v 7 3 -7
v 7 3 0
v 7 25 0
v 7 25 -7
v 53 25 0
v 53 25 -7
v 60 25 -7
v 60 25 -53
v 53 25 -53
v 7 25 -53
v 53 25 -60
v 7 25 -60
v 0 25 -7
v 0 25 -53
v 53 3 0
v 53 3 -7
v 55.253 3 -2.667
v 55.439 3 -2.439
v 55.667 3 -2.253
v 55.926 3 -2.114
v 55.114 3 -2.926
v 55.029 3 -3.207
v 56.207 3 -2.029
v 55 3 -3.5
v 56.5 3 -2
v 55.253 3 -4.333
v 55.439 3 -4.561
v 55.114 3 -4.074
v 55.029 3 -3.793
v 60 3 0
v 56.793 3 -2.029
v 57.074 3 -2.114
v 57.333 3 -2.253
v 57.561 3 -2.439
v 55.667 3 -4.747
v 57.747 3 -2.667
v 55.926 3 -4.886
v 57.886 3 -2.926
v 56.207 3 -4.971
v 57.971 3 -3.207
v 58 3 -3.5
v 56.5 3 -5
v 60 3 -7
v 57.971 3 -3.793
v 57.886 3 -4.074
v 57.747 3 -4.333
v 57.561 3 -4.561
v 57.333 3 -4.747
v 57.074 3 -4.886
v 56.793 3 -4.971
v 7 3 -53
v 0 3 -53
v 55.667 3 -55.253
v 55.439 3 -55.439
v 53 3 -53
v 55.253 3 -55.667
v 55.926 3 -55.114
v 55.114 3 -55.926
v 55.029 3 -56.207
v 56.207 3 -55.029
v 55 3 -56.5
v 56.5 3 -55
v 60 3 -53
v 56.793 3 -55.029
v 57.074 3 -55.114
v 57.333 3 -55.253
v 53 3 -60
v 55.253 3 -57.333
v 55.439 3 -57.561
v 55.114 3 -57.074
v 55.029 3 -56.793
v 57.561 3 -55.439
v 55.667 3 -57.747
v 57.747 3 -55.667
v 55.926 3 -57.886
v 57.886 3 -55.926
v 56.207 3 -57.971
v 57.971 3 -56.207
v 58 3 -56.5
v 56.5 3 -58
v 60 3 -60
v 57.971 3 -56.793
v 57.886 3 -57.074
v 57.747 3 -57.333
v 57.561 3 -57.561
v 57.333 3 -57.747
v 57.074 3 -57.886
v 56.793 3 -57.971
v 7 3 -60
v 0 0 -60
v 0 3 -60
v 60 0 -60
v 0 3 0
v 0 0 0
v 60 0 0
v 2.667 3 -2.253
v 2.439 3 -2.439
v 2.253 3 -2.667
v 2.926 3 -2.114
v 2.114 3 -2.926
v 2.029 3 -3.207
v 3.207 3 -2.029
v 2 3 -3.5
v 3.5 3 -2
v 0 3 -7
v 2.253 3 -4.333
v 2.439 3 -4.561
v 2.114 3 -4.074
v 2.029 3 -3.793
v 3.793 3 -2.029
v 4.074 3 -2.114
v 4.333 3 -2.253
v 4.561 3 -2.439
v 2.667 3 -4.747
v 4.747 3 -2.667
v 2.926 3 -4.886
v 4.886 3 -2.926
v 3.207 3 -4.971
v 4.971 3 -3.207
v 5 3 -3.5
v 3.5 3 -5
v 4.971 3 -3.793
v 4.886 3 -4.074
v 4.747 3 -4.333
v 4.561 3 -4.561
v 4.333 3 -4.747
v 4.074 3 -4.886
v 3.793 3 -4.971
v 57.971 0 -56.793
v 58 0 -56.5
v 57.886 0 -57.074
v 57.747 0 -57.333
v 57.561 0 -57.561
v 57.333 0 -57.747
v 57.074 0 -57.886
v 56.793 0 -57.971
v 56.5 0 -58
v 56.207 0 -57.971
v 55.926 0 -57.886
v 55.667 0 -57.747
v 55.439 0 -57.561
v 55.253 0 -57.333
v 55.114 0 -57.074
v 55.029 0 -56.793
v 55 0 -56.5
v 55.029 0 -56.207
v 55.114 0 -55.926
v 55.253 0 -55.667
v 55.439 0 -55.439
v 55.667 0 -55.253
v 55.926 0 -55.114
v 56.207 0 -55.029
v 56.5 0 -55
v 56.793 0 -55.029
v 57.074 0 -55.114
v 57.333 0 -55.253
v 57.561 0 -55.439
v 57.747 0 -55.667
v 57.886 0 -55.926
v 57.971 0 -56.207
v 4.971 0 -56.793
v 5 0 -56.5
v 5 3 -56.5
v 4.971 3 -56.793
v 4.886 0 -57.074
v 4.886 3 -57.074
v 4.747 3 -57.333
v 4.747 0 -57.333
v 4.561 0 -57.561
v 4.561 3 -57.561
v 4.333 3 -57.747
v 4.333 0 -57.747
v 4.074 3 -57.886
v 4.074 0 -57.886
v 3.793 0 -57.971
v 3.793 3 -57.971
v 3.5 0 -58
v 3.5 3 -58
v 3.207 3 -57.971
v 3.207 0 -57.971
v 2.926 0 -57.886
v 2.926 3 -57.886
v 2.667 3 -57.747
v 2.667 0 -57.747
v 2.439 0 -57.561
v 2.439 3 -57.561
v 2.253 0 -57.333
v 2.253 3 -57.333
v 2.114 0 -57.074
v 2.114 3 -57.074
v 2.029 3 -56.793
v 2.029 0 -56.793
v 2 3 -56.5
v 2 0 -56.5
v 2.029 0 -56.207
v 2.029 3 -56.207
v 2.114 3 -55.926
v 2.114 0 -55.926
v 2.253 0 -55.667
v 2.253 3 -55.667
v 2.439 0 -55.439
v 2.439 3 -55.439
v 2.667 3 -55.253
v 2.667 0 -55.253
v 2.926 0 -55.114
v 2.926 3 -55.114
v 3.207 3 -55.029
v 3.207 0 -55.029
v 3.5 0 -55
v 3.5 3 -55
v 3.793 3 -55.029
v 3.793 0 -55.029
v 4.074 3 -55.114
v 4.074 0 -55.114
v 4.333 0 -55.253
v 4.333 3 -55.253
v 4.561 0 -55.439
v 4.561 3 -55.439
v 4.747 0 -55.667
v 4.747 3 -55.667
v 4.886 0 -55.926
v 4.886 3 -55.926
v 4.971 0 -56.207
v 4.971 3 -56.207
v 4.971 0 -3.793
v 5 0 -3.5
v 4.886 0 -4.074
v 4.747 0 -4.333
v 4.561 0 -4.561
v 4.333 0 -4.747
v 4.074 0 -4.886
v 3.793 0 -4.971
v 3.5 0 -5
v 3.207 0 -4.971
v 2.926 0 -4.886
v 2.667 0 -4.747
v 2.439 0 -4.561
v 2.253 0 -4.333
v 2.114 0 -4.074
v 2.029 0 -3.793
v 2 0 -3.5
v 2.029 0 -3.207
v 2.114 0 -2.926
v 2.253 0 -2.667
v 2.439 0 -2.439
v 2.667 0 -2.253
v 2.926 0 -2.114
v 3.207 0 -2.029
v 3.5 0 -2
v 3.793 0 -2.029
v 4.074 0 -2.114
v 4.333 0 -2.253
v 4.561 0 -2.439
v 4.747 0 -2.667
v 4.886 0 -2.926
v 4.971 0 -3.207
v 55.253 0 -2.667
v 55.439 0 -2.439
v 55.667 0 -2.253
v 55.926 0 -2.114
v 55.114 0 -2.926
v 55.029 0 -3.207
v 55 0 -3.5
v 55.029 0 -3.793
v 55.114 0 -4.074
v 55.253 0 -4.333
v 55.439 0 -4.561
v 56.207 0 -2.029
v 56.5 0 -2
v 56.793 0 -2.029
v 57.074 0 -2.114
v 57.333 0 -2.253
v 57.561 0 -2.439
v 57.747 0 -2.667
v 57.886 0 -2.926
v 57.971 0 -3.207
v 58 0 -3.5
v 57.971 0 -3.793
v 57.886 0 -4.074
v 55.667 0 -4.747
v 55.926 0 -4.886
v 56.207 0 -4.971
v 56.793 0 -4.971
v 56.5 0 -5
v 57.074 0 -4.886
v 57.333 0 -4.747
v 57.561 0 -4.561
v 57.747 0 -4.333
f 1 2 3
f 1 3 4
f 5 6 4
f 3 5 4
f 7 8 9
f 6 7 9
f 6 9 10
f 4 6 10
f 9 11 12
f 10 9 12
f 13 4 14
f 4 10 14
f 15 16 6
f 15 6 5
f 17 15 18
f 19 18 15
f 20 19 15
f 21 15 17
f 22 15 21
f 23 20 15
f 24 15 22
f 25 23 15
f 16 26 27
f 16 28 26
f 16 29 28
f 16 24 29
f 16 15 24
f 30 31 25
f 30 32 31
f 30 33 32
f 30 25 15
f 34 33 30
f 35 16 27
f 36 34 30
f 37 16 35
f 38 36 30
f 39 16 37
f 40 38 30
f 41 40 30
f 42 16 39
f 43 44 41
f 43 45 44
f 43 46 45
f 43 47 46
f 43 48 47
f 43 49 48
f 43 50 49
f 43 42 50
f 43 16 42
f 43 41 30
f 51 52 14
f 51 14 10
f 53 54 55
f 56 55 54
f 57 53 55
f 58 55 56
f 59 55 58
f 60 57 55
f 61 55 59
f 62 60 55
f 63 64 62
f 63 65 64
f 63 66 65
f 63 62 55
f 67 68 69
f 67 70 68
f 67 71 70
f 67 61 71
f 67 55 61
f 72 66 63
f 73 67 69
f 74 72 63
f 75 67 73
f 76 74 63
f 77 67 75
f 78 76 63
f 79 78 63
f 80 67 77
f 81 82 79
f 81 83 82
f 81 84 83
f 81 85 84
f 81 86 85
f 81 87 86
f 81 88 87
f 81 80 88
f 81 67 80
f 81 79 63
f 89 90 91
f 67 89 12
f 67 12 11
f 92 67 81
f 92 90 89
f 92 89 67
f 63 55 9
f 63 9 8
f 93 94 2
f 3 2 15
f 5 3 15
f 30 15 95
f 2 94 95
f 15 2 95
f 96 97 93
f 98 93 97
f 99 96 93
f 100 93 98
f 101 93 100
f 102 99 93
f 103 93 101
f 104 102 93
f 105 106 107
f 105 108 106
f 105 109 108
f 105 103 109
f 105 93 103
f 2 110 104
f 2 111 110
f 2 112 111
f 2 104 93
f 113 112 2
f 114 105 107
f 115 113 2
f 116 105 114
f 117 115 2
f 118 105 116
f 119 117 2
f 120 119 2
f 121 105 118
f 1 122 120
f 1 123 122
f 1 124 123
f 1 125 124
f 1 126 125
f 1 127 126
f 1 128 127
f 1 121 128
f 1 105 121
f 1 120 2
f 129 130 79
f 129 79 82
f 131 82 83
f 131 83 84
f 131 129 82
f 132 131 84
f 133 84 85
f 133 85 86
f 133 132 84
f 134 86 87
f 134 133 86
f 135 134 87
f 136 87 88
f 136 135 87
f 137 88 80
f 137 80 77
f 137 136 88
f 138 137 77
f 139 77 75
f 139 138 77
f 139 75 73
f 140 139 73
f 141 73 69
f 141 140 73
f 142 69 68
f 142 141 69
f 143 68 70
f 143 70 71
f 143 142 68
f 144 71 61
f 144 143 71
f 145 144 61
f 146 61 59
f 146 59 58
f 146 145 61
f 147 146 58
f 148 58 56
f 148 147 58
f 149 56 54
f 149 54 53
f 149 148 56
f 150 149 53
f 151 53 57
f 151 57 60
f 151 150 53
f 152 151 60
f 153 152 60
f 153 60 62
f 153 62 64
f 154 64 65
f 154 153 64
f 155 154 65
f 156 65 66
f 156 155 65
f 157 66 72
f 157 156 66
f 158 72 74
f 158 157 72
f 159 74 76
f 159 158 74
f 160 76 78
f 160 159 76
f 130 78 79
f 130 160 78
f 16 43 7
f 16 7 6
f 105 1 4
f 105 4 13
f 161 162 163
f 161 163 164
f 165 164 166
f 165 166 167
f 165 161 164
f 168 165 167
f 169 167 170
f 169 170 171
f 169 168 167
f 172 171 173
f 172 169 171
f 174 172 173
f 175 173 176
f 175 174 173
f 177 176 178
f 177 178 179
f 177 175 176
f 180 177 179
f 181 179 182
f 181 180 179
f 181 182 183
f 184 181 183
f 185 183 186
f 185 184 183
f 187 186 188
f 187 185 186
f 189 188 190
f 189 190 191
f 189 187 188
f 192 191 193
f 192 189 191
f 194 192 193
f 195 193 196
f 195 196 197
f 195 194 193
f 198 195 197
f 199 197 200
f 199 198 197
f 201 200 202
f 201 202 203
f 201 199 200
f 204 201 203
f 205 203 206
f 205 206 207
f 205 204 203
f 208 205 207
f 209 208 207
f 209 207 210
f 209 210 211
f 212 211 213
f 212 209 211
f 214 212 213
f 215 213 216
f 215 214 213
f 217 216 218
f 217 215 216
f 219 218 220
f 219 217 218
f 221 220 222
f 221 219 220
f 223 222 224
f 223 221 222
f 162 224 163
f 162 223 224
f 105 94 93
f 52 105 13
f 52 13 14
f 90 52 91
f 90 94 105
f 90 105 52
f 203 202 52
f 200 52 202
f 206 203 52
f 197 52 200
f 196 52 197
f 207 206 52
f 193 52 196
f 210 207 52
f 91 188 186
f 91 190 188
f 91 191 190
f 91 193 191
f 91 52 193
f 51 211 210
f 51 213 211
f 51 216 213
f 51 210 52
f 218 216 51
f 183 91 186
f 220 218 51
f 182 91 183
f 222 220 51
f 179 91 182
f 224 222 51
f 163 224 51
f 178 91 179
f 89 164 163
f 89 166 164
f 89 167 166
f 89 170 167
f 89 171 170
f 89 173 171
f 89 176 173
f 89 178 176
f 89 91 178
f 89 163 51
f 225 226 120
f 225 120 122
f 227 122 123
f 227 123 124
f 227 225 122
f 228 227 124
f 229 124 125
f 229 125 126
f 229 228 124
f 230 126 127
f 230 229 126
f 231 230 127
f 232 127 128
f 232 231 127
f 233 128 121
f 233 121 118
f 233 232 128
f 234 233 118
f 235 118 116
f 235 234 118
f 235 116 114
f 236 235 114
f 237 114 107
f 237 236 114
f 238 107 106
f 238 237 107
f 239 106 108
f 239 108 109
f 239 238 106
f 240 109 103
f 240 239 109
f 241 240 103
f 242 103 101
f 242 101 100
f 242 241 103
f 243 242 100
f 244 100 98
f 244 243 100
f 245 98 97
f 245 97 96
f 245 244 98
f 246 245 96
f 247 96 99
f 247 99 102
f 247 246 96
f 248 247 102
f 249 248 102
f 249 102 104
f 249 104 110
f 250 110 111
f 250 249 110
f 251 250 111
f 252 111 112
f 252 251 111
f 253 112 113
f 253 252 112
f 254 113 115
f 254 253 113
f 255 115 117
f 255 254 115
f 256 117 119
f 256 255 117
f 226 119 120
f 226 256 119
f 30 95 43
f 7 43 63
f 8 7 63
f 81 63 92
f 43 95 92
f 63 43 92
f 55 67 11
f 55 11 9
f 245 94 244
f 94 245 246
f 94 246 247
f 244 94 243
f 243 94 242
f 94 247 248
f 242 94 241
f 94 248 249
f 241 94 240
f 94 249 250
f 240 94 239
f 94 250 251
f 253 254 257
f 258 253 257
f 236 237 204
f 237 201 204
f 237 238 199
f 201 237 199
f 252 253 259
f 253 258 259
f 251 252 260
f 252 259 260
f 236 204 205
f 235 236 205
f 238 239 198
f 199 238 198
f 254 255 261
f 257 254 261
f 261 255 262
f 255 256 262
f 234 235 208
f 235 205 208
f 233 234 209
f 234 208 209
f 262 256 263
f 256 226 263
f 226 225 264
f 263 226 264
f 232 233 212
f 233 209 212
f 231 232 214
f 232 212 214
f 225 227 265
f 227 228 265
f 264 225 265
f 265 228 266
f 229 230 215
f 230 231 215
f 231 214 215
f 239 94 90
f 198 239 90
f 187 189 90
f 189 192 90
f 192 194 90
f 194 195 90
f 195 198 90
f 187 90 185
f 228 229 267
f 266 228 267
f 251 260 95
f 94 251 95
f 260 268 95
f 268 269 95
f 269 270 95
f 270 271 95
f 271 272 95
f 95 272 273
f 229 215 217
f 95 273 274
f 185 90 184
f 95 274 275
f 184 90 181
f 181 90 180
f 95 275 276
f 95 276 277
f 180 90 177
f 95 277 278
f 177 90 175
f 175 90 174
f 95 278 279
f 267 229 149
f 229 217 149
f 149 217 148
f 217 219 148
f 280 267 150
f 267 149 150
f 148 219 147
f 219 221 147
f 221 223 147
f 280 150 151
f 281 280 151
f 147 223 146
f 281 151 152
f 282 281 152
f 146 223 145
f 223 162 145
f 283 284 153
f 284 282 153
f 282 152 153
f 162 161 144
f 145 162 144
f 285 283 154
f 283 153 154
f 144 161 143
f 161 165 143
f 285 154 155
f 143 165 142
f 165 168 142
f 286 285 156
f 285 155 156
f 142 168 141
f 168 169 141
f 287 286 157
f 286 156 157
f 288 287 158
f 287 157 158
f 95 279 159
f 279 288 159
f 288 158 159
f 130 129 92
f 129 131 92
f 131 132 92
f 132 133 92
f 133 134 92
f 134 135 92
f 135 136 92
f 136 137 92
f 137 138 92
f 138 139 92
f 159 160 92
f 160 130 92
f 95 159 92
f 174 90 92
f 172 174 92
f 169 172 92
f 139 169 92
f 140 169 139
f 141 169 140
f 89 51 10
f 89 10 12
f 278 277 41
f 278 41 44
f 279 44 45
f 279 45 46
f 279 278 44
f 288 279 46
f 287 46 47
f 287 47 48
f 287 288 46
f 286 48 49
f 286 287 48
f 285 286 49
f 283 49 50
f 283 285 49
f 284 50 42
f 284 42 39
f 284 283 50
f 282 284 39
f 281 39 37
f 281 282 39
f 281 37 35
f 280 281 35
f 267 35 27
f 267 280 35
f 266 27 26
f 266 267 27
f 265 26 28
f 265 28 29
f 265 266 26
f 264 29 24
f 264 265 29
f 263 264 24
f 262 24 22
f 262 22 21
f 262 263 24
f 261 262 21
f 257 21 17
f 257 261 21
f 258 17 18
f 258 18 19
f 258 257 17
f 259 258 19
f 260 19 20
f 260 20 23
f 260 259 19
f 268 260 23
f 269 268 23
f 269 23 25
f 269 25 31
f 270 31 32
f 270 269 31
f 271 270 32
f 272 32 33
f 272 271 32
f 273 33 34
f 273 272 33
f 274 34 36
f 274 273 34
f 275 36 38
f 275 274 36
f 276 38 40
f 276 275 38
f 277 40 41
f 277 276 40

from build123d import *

# Parameters (mm, degrees)
SKETCH1_W           = 60
SKETCH1_H           = 60
SKETCH1_R           = 1.5
BOSS_EXTRUDE1_DEPTH = 3
BOSS_EXTRUDE2_DEPTH = 22


with BuildPart() as part:
    # Sketch1 → Boss-Extrude1 (new body)
    with BuildSketch(Plane(origin=(0, 0, 0), x_dir=(1, 0, 0), z_dir=(0, 1, 0))):
        with Locations((30, 30)):
            Rectangle(SKETCH1_W, SKETCH1_H)
        with Locations((3.5, 3.5)):
            Circle(SKETCH1_R, mode=Mode.SUBTRACT)
        with Locations((56.5, 3.5)):
            Circle(SKETCH1_R, mode=Mode.SUBTRACT)
        with Locations((56.5, 56.5)):
            Circle(SKETCH1_R, mode=Mode.SUBTRACT)
        with Locations((3.5, 56.5)):
            Circle(SKETCH1_R, mode=Mode.SUBTRACT)
    extrude(amount=BOSS_EXTRUDE1_DEPTH)

    # Sketch2 → Boss-Extrude2 (add)
    with BuildSketch(Plane(origin=(0, 3, 0), x_dir=(1, 0, 0), z_dir=(0, 1, 0))):
        Polygon((7, 60), (53, 60), (53, 53), (60, 53), (60, 7), (53, 7), (53, 0), (7, 0), (7, 7), (0, 7), (0, 53), (7, 53), align=None)
    extrude(amount=BOSS_EXTRUDE2_DEPTH)


solid = part.part
